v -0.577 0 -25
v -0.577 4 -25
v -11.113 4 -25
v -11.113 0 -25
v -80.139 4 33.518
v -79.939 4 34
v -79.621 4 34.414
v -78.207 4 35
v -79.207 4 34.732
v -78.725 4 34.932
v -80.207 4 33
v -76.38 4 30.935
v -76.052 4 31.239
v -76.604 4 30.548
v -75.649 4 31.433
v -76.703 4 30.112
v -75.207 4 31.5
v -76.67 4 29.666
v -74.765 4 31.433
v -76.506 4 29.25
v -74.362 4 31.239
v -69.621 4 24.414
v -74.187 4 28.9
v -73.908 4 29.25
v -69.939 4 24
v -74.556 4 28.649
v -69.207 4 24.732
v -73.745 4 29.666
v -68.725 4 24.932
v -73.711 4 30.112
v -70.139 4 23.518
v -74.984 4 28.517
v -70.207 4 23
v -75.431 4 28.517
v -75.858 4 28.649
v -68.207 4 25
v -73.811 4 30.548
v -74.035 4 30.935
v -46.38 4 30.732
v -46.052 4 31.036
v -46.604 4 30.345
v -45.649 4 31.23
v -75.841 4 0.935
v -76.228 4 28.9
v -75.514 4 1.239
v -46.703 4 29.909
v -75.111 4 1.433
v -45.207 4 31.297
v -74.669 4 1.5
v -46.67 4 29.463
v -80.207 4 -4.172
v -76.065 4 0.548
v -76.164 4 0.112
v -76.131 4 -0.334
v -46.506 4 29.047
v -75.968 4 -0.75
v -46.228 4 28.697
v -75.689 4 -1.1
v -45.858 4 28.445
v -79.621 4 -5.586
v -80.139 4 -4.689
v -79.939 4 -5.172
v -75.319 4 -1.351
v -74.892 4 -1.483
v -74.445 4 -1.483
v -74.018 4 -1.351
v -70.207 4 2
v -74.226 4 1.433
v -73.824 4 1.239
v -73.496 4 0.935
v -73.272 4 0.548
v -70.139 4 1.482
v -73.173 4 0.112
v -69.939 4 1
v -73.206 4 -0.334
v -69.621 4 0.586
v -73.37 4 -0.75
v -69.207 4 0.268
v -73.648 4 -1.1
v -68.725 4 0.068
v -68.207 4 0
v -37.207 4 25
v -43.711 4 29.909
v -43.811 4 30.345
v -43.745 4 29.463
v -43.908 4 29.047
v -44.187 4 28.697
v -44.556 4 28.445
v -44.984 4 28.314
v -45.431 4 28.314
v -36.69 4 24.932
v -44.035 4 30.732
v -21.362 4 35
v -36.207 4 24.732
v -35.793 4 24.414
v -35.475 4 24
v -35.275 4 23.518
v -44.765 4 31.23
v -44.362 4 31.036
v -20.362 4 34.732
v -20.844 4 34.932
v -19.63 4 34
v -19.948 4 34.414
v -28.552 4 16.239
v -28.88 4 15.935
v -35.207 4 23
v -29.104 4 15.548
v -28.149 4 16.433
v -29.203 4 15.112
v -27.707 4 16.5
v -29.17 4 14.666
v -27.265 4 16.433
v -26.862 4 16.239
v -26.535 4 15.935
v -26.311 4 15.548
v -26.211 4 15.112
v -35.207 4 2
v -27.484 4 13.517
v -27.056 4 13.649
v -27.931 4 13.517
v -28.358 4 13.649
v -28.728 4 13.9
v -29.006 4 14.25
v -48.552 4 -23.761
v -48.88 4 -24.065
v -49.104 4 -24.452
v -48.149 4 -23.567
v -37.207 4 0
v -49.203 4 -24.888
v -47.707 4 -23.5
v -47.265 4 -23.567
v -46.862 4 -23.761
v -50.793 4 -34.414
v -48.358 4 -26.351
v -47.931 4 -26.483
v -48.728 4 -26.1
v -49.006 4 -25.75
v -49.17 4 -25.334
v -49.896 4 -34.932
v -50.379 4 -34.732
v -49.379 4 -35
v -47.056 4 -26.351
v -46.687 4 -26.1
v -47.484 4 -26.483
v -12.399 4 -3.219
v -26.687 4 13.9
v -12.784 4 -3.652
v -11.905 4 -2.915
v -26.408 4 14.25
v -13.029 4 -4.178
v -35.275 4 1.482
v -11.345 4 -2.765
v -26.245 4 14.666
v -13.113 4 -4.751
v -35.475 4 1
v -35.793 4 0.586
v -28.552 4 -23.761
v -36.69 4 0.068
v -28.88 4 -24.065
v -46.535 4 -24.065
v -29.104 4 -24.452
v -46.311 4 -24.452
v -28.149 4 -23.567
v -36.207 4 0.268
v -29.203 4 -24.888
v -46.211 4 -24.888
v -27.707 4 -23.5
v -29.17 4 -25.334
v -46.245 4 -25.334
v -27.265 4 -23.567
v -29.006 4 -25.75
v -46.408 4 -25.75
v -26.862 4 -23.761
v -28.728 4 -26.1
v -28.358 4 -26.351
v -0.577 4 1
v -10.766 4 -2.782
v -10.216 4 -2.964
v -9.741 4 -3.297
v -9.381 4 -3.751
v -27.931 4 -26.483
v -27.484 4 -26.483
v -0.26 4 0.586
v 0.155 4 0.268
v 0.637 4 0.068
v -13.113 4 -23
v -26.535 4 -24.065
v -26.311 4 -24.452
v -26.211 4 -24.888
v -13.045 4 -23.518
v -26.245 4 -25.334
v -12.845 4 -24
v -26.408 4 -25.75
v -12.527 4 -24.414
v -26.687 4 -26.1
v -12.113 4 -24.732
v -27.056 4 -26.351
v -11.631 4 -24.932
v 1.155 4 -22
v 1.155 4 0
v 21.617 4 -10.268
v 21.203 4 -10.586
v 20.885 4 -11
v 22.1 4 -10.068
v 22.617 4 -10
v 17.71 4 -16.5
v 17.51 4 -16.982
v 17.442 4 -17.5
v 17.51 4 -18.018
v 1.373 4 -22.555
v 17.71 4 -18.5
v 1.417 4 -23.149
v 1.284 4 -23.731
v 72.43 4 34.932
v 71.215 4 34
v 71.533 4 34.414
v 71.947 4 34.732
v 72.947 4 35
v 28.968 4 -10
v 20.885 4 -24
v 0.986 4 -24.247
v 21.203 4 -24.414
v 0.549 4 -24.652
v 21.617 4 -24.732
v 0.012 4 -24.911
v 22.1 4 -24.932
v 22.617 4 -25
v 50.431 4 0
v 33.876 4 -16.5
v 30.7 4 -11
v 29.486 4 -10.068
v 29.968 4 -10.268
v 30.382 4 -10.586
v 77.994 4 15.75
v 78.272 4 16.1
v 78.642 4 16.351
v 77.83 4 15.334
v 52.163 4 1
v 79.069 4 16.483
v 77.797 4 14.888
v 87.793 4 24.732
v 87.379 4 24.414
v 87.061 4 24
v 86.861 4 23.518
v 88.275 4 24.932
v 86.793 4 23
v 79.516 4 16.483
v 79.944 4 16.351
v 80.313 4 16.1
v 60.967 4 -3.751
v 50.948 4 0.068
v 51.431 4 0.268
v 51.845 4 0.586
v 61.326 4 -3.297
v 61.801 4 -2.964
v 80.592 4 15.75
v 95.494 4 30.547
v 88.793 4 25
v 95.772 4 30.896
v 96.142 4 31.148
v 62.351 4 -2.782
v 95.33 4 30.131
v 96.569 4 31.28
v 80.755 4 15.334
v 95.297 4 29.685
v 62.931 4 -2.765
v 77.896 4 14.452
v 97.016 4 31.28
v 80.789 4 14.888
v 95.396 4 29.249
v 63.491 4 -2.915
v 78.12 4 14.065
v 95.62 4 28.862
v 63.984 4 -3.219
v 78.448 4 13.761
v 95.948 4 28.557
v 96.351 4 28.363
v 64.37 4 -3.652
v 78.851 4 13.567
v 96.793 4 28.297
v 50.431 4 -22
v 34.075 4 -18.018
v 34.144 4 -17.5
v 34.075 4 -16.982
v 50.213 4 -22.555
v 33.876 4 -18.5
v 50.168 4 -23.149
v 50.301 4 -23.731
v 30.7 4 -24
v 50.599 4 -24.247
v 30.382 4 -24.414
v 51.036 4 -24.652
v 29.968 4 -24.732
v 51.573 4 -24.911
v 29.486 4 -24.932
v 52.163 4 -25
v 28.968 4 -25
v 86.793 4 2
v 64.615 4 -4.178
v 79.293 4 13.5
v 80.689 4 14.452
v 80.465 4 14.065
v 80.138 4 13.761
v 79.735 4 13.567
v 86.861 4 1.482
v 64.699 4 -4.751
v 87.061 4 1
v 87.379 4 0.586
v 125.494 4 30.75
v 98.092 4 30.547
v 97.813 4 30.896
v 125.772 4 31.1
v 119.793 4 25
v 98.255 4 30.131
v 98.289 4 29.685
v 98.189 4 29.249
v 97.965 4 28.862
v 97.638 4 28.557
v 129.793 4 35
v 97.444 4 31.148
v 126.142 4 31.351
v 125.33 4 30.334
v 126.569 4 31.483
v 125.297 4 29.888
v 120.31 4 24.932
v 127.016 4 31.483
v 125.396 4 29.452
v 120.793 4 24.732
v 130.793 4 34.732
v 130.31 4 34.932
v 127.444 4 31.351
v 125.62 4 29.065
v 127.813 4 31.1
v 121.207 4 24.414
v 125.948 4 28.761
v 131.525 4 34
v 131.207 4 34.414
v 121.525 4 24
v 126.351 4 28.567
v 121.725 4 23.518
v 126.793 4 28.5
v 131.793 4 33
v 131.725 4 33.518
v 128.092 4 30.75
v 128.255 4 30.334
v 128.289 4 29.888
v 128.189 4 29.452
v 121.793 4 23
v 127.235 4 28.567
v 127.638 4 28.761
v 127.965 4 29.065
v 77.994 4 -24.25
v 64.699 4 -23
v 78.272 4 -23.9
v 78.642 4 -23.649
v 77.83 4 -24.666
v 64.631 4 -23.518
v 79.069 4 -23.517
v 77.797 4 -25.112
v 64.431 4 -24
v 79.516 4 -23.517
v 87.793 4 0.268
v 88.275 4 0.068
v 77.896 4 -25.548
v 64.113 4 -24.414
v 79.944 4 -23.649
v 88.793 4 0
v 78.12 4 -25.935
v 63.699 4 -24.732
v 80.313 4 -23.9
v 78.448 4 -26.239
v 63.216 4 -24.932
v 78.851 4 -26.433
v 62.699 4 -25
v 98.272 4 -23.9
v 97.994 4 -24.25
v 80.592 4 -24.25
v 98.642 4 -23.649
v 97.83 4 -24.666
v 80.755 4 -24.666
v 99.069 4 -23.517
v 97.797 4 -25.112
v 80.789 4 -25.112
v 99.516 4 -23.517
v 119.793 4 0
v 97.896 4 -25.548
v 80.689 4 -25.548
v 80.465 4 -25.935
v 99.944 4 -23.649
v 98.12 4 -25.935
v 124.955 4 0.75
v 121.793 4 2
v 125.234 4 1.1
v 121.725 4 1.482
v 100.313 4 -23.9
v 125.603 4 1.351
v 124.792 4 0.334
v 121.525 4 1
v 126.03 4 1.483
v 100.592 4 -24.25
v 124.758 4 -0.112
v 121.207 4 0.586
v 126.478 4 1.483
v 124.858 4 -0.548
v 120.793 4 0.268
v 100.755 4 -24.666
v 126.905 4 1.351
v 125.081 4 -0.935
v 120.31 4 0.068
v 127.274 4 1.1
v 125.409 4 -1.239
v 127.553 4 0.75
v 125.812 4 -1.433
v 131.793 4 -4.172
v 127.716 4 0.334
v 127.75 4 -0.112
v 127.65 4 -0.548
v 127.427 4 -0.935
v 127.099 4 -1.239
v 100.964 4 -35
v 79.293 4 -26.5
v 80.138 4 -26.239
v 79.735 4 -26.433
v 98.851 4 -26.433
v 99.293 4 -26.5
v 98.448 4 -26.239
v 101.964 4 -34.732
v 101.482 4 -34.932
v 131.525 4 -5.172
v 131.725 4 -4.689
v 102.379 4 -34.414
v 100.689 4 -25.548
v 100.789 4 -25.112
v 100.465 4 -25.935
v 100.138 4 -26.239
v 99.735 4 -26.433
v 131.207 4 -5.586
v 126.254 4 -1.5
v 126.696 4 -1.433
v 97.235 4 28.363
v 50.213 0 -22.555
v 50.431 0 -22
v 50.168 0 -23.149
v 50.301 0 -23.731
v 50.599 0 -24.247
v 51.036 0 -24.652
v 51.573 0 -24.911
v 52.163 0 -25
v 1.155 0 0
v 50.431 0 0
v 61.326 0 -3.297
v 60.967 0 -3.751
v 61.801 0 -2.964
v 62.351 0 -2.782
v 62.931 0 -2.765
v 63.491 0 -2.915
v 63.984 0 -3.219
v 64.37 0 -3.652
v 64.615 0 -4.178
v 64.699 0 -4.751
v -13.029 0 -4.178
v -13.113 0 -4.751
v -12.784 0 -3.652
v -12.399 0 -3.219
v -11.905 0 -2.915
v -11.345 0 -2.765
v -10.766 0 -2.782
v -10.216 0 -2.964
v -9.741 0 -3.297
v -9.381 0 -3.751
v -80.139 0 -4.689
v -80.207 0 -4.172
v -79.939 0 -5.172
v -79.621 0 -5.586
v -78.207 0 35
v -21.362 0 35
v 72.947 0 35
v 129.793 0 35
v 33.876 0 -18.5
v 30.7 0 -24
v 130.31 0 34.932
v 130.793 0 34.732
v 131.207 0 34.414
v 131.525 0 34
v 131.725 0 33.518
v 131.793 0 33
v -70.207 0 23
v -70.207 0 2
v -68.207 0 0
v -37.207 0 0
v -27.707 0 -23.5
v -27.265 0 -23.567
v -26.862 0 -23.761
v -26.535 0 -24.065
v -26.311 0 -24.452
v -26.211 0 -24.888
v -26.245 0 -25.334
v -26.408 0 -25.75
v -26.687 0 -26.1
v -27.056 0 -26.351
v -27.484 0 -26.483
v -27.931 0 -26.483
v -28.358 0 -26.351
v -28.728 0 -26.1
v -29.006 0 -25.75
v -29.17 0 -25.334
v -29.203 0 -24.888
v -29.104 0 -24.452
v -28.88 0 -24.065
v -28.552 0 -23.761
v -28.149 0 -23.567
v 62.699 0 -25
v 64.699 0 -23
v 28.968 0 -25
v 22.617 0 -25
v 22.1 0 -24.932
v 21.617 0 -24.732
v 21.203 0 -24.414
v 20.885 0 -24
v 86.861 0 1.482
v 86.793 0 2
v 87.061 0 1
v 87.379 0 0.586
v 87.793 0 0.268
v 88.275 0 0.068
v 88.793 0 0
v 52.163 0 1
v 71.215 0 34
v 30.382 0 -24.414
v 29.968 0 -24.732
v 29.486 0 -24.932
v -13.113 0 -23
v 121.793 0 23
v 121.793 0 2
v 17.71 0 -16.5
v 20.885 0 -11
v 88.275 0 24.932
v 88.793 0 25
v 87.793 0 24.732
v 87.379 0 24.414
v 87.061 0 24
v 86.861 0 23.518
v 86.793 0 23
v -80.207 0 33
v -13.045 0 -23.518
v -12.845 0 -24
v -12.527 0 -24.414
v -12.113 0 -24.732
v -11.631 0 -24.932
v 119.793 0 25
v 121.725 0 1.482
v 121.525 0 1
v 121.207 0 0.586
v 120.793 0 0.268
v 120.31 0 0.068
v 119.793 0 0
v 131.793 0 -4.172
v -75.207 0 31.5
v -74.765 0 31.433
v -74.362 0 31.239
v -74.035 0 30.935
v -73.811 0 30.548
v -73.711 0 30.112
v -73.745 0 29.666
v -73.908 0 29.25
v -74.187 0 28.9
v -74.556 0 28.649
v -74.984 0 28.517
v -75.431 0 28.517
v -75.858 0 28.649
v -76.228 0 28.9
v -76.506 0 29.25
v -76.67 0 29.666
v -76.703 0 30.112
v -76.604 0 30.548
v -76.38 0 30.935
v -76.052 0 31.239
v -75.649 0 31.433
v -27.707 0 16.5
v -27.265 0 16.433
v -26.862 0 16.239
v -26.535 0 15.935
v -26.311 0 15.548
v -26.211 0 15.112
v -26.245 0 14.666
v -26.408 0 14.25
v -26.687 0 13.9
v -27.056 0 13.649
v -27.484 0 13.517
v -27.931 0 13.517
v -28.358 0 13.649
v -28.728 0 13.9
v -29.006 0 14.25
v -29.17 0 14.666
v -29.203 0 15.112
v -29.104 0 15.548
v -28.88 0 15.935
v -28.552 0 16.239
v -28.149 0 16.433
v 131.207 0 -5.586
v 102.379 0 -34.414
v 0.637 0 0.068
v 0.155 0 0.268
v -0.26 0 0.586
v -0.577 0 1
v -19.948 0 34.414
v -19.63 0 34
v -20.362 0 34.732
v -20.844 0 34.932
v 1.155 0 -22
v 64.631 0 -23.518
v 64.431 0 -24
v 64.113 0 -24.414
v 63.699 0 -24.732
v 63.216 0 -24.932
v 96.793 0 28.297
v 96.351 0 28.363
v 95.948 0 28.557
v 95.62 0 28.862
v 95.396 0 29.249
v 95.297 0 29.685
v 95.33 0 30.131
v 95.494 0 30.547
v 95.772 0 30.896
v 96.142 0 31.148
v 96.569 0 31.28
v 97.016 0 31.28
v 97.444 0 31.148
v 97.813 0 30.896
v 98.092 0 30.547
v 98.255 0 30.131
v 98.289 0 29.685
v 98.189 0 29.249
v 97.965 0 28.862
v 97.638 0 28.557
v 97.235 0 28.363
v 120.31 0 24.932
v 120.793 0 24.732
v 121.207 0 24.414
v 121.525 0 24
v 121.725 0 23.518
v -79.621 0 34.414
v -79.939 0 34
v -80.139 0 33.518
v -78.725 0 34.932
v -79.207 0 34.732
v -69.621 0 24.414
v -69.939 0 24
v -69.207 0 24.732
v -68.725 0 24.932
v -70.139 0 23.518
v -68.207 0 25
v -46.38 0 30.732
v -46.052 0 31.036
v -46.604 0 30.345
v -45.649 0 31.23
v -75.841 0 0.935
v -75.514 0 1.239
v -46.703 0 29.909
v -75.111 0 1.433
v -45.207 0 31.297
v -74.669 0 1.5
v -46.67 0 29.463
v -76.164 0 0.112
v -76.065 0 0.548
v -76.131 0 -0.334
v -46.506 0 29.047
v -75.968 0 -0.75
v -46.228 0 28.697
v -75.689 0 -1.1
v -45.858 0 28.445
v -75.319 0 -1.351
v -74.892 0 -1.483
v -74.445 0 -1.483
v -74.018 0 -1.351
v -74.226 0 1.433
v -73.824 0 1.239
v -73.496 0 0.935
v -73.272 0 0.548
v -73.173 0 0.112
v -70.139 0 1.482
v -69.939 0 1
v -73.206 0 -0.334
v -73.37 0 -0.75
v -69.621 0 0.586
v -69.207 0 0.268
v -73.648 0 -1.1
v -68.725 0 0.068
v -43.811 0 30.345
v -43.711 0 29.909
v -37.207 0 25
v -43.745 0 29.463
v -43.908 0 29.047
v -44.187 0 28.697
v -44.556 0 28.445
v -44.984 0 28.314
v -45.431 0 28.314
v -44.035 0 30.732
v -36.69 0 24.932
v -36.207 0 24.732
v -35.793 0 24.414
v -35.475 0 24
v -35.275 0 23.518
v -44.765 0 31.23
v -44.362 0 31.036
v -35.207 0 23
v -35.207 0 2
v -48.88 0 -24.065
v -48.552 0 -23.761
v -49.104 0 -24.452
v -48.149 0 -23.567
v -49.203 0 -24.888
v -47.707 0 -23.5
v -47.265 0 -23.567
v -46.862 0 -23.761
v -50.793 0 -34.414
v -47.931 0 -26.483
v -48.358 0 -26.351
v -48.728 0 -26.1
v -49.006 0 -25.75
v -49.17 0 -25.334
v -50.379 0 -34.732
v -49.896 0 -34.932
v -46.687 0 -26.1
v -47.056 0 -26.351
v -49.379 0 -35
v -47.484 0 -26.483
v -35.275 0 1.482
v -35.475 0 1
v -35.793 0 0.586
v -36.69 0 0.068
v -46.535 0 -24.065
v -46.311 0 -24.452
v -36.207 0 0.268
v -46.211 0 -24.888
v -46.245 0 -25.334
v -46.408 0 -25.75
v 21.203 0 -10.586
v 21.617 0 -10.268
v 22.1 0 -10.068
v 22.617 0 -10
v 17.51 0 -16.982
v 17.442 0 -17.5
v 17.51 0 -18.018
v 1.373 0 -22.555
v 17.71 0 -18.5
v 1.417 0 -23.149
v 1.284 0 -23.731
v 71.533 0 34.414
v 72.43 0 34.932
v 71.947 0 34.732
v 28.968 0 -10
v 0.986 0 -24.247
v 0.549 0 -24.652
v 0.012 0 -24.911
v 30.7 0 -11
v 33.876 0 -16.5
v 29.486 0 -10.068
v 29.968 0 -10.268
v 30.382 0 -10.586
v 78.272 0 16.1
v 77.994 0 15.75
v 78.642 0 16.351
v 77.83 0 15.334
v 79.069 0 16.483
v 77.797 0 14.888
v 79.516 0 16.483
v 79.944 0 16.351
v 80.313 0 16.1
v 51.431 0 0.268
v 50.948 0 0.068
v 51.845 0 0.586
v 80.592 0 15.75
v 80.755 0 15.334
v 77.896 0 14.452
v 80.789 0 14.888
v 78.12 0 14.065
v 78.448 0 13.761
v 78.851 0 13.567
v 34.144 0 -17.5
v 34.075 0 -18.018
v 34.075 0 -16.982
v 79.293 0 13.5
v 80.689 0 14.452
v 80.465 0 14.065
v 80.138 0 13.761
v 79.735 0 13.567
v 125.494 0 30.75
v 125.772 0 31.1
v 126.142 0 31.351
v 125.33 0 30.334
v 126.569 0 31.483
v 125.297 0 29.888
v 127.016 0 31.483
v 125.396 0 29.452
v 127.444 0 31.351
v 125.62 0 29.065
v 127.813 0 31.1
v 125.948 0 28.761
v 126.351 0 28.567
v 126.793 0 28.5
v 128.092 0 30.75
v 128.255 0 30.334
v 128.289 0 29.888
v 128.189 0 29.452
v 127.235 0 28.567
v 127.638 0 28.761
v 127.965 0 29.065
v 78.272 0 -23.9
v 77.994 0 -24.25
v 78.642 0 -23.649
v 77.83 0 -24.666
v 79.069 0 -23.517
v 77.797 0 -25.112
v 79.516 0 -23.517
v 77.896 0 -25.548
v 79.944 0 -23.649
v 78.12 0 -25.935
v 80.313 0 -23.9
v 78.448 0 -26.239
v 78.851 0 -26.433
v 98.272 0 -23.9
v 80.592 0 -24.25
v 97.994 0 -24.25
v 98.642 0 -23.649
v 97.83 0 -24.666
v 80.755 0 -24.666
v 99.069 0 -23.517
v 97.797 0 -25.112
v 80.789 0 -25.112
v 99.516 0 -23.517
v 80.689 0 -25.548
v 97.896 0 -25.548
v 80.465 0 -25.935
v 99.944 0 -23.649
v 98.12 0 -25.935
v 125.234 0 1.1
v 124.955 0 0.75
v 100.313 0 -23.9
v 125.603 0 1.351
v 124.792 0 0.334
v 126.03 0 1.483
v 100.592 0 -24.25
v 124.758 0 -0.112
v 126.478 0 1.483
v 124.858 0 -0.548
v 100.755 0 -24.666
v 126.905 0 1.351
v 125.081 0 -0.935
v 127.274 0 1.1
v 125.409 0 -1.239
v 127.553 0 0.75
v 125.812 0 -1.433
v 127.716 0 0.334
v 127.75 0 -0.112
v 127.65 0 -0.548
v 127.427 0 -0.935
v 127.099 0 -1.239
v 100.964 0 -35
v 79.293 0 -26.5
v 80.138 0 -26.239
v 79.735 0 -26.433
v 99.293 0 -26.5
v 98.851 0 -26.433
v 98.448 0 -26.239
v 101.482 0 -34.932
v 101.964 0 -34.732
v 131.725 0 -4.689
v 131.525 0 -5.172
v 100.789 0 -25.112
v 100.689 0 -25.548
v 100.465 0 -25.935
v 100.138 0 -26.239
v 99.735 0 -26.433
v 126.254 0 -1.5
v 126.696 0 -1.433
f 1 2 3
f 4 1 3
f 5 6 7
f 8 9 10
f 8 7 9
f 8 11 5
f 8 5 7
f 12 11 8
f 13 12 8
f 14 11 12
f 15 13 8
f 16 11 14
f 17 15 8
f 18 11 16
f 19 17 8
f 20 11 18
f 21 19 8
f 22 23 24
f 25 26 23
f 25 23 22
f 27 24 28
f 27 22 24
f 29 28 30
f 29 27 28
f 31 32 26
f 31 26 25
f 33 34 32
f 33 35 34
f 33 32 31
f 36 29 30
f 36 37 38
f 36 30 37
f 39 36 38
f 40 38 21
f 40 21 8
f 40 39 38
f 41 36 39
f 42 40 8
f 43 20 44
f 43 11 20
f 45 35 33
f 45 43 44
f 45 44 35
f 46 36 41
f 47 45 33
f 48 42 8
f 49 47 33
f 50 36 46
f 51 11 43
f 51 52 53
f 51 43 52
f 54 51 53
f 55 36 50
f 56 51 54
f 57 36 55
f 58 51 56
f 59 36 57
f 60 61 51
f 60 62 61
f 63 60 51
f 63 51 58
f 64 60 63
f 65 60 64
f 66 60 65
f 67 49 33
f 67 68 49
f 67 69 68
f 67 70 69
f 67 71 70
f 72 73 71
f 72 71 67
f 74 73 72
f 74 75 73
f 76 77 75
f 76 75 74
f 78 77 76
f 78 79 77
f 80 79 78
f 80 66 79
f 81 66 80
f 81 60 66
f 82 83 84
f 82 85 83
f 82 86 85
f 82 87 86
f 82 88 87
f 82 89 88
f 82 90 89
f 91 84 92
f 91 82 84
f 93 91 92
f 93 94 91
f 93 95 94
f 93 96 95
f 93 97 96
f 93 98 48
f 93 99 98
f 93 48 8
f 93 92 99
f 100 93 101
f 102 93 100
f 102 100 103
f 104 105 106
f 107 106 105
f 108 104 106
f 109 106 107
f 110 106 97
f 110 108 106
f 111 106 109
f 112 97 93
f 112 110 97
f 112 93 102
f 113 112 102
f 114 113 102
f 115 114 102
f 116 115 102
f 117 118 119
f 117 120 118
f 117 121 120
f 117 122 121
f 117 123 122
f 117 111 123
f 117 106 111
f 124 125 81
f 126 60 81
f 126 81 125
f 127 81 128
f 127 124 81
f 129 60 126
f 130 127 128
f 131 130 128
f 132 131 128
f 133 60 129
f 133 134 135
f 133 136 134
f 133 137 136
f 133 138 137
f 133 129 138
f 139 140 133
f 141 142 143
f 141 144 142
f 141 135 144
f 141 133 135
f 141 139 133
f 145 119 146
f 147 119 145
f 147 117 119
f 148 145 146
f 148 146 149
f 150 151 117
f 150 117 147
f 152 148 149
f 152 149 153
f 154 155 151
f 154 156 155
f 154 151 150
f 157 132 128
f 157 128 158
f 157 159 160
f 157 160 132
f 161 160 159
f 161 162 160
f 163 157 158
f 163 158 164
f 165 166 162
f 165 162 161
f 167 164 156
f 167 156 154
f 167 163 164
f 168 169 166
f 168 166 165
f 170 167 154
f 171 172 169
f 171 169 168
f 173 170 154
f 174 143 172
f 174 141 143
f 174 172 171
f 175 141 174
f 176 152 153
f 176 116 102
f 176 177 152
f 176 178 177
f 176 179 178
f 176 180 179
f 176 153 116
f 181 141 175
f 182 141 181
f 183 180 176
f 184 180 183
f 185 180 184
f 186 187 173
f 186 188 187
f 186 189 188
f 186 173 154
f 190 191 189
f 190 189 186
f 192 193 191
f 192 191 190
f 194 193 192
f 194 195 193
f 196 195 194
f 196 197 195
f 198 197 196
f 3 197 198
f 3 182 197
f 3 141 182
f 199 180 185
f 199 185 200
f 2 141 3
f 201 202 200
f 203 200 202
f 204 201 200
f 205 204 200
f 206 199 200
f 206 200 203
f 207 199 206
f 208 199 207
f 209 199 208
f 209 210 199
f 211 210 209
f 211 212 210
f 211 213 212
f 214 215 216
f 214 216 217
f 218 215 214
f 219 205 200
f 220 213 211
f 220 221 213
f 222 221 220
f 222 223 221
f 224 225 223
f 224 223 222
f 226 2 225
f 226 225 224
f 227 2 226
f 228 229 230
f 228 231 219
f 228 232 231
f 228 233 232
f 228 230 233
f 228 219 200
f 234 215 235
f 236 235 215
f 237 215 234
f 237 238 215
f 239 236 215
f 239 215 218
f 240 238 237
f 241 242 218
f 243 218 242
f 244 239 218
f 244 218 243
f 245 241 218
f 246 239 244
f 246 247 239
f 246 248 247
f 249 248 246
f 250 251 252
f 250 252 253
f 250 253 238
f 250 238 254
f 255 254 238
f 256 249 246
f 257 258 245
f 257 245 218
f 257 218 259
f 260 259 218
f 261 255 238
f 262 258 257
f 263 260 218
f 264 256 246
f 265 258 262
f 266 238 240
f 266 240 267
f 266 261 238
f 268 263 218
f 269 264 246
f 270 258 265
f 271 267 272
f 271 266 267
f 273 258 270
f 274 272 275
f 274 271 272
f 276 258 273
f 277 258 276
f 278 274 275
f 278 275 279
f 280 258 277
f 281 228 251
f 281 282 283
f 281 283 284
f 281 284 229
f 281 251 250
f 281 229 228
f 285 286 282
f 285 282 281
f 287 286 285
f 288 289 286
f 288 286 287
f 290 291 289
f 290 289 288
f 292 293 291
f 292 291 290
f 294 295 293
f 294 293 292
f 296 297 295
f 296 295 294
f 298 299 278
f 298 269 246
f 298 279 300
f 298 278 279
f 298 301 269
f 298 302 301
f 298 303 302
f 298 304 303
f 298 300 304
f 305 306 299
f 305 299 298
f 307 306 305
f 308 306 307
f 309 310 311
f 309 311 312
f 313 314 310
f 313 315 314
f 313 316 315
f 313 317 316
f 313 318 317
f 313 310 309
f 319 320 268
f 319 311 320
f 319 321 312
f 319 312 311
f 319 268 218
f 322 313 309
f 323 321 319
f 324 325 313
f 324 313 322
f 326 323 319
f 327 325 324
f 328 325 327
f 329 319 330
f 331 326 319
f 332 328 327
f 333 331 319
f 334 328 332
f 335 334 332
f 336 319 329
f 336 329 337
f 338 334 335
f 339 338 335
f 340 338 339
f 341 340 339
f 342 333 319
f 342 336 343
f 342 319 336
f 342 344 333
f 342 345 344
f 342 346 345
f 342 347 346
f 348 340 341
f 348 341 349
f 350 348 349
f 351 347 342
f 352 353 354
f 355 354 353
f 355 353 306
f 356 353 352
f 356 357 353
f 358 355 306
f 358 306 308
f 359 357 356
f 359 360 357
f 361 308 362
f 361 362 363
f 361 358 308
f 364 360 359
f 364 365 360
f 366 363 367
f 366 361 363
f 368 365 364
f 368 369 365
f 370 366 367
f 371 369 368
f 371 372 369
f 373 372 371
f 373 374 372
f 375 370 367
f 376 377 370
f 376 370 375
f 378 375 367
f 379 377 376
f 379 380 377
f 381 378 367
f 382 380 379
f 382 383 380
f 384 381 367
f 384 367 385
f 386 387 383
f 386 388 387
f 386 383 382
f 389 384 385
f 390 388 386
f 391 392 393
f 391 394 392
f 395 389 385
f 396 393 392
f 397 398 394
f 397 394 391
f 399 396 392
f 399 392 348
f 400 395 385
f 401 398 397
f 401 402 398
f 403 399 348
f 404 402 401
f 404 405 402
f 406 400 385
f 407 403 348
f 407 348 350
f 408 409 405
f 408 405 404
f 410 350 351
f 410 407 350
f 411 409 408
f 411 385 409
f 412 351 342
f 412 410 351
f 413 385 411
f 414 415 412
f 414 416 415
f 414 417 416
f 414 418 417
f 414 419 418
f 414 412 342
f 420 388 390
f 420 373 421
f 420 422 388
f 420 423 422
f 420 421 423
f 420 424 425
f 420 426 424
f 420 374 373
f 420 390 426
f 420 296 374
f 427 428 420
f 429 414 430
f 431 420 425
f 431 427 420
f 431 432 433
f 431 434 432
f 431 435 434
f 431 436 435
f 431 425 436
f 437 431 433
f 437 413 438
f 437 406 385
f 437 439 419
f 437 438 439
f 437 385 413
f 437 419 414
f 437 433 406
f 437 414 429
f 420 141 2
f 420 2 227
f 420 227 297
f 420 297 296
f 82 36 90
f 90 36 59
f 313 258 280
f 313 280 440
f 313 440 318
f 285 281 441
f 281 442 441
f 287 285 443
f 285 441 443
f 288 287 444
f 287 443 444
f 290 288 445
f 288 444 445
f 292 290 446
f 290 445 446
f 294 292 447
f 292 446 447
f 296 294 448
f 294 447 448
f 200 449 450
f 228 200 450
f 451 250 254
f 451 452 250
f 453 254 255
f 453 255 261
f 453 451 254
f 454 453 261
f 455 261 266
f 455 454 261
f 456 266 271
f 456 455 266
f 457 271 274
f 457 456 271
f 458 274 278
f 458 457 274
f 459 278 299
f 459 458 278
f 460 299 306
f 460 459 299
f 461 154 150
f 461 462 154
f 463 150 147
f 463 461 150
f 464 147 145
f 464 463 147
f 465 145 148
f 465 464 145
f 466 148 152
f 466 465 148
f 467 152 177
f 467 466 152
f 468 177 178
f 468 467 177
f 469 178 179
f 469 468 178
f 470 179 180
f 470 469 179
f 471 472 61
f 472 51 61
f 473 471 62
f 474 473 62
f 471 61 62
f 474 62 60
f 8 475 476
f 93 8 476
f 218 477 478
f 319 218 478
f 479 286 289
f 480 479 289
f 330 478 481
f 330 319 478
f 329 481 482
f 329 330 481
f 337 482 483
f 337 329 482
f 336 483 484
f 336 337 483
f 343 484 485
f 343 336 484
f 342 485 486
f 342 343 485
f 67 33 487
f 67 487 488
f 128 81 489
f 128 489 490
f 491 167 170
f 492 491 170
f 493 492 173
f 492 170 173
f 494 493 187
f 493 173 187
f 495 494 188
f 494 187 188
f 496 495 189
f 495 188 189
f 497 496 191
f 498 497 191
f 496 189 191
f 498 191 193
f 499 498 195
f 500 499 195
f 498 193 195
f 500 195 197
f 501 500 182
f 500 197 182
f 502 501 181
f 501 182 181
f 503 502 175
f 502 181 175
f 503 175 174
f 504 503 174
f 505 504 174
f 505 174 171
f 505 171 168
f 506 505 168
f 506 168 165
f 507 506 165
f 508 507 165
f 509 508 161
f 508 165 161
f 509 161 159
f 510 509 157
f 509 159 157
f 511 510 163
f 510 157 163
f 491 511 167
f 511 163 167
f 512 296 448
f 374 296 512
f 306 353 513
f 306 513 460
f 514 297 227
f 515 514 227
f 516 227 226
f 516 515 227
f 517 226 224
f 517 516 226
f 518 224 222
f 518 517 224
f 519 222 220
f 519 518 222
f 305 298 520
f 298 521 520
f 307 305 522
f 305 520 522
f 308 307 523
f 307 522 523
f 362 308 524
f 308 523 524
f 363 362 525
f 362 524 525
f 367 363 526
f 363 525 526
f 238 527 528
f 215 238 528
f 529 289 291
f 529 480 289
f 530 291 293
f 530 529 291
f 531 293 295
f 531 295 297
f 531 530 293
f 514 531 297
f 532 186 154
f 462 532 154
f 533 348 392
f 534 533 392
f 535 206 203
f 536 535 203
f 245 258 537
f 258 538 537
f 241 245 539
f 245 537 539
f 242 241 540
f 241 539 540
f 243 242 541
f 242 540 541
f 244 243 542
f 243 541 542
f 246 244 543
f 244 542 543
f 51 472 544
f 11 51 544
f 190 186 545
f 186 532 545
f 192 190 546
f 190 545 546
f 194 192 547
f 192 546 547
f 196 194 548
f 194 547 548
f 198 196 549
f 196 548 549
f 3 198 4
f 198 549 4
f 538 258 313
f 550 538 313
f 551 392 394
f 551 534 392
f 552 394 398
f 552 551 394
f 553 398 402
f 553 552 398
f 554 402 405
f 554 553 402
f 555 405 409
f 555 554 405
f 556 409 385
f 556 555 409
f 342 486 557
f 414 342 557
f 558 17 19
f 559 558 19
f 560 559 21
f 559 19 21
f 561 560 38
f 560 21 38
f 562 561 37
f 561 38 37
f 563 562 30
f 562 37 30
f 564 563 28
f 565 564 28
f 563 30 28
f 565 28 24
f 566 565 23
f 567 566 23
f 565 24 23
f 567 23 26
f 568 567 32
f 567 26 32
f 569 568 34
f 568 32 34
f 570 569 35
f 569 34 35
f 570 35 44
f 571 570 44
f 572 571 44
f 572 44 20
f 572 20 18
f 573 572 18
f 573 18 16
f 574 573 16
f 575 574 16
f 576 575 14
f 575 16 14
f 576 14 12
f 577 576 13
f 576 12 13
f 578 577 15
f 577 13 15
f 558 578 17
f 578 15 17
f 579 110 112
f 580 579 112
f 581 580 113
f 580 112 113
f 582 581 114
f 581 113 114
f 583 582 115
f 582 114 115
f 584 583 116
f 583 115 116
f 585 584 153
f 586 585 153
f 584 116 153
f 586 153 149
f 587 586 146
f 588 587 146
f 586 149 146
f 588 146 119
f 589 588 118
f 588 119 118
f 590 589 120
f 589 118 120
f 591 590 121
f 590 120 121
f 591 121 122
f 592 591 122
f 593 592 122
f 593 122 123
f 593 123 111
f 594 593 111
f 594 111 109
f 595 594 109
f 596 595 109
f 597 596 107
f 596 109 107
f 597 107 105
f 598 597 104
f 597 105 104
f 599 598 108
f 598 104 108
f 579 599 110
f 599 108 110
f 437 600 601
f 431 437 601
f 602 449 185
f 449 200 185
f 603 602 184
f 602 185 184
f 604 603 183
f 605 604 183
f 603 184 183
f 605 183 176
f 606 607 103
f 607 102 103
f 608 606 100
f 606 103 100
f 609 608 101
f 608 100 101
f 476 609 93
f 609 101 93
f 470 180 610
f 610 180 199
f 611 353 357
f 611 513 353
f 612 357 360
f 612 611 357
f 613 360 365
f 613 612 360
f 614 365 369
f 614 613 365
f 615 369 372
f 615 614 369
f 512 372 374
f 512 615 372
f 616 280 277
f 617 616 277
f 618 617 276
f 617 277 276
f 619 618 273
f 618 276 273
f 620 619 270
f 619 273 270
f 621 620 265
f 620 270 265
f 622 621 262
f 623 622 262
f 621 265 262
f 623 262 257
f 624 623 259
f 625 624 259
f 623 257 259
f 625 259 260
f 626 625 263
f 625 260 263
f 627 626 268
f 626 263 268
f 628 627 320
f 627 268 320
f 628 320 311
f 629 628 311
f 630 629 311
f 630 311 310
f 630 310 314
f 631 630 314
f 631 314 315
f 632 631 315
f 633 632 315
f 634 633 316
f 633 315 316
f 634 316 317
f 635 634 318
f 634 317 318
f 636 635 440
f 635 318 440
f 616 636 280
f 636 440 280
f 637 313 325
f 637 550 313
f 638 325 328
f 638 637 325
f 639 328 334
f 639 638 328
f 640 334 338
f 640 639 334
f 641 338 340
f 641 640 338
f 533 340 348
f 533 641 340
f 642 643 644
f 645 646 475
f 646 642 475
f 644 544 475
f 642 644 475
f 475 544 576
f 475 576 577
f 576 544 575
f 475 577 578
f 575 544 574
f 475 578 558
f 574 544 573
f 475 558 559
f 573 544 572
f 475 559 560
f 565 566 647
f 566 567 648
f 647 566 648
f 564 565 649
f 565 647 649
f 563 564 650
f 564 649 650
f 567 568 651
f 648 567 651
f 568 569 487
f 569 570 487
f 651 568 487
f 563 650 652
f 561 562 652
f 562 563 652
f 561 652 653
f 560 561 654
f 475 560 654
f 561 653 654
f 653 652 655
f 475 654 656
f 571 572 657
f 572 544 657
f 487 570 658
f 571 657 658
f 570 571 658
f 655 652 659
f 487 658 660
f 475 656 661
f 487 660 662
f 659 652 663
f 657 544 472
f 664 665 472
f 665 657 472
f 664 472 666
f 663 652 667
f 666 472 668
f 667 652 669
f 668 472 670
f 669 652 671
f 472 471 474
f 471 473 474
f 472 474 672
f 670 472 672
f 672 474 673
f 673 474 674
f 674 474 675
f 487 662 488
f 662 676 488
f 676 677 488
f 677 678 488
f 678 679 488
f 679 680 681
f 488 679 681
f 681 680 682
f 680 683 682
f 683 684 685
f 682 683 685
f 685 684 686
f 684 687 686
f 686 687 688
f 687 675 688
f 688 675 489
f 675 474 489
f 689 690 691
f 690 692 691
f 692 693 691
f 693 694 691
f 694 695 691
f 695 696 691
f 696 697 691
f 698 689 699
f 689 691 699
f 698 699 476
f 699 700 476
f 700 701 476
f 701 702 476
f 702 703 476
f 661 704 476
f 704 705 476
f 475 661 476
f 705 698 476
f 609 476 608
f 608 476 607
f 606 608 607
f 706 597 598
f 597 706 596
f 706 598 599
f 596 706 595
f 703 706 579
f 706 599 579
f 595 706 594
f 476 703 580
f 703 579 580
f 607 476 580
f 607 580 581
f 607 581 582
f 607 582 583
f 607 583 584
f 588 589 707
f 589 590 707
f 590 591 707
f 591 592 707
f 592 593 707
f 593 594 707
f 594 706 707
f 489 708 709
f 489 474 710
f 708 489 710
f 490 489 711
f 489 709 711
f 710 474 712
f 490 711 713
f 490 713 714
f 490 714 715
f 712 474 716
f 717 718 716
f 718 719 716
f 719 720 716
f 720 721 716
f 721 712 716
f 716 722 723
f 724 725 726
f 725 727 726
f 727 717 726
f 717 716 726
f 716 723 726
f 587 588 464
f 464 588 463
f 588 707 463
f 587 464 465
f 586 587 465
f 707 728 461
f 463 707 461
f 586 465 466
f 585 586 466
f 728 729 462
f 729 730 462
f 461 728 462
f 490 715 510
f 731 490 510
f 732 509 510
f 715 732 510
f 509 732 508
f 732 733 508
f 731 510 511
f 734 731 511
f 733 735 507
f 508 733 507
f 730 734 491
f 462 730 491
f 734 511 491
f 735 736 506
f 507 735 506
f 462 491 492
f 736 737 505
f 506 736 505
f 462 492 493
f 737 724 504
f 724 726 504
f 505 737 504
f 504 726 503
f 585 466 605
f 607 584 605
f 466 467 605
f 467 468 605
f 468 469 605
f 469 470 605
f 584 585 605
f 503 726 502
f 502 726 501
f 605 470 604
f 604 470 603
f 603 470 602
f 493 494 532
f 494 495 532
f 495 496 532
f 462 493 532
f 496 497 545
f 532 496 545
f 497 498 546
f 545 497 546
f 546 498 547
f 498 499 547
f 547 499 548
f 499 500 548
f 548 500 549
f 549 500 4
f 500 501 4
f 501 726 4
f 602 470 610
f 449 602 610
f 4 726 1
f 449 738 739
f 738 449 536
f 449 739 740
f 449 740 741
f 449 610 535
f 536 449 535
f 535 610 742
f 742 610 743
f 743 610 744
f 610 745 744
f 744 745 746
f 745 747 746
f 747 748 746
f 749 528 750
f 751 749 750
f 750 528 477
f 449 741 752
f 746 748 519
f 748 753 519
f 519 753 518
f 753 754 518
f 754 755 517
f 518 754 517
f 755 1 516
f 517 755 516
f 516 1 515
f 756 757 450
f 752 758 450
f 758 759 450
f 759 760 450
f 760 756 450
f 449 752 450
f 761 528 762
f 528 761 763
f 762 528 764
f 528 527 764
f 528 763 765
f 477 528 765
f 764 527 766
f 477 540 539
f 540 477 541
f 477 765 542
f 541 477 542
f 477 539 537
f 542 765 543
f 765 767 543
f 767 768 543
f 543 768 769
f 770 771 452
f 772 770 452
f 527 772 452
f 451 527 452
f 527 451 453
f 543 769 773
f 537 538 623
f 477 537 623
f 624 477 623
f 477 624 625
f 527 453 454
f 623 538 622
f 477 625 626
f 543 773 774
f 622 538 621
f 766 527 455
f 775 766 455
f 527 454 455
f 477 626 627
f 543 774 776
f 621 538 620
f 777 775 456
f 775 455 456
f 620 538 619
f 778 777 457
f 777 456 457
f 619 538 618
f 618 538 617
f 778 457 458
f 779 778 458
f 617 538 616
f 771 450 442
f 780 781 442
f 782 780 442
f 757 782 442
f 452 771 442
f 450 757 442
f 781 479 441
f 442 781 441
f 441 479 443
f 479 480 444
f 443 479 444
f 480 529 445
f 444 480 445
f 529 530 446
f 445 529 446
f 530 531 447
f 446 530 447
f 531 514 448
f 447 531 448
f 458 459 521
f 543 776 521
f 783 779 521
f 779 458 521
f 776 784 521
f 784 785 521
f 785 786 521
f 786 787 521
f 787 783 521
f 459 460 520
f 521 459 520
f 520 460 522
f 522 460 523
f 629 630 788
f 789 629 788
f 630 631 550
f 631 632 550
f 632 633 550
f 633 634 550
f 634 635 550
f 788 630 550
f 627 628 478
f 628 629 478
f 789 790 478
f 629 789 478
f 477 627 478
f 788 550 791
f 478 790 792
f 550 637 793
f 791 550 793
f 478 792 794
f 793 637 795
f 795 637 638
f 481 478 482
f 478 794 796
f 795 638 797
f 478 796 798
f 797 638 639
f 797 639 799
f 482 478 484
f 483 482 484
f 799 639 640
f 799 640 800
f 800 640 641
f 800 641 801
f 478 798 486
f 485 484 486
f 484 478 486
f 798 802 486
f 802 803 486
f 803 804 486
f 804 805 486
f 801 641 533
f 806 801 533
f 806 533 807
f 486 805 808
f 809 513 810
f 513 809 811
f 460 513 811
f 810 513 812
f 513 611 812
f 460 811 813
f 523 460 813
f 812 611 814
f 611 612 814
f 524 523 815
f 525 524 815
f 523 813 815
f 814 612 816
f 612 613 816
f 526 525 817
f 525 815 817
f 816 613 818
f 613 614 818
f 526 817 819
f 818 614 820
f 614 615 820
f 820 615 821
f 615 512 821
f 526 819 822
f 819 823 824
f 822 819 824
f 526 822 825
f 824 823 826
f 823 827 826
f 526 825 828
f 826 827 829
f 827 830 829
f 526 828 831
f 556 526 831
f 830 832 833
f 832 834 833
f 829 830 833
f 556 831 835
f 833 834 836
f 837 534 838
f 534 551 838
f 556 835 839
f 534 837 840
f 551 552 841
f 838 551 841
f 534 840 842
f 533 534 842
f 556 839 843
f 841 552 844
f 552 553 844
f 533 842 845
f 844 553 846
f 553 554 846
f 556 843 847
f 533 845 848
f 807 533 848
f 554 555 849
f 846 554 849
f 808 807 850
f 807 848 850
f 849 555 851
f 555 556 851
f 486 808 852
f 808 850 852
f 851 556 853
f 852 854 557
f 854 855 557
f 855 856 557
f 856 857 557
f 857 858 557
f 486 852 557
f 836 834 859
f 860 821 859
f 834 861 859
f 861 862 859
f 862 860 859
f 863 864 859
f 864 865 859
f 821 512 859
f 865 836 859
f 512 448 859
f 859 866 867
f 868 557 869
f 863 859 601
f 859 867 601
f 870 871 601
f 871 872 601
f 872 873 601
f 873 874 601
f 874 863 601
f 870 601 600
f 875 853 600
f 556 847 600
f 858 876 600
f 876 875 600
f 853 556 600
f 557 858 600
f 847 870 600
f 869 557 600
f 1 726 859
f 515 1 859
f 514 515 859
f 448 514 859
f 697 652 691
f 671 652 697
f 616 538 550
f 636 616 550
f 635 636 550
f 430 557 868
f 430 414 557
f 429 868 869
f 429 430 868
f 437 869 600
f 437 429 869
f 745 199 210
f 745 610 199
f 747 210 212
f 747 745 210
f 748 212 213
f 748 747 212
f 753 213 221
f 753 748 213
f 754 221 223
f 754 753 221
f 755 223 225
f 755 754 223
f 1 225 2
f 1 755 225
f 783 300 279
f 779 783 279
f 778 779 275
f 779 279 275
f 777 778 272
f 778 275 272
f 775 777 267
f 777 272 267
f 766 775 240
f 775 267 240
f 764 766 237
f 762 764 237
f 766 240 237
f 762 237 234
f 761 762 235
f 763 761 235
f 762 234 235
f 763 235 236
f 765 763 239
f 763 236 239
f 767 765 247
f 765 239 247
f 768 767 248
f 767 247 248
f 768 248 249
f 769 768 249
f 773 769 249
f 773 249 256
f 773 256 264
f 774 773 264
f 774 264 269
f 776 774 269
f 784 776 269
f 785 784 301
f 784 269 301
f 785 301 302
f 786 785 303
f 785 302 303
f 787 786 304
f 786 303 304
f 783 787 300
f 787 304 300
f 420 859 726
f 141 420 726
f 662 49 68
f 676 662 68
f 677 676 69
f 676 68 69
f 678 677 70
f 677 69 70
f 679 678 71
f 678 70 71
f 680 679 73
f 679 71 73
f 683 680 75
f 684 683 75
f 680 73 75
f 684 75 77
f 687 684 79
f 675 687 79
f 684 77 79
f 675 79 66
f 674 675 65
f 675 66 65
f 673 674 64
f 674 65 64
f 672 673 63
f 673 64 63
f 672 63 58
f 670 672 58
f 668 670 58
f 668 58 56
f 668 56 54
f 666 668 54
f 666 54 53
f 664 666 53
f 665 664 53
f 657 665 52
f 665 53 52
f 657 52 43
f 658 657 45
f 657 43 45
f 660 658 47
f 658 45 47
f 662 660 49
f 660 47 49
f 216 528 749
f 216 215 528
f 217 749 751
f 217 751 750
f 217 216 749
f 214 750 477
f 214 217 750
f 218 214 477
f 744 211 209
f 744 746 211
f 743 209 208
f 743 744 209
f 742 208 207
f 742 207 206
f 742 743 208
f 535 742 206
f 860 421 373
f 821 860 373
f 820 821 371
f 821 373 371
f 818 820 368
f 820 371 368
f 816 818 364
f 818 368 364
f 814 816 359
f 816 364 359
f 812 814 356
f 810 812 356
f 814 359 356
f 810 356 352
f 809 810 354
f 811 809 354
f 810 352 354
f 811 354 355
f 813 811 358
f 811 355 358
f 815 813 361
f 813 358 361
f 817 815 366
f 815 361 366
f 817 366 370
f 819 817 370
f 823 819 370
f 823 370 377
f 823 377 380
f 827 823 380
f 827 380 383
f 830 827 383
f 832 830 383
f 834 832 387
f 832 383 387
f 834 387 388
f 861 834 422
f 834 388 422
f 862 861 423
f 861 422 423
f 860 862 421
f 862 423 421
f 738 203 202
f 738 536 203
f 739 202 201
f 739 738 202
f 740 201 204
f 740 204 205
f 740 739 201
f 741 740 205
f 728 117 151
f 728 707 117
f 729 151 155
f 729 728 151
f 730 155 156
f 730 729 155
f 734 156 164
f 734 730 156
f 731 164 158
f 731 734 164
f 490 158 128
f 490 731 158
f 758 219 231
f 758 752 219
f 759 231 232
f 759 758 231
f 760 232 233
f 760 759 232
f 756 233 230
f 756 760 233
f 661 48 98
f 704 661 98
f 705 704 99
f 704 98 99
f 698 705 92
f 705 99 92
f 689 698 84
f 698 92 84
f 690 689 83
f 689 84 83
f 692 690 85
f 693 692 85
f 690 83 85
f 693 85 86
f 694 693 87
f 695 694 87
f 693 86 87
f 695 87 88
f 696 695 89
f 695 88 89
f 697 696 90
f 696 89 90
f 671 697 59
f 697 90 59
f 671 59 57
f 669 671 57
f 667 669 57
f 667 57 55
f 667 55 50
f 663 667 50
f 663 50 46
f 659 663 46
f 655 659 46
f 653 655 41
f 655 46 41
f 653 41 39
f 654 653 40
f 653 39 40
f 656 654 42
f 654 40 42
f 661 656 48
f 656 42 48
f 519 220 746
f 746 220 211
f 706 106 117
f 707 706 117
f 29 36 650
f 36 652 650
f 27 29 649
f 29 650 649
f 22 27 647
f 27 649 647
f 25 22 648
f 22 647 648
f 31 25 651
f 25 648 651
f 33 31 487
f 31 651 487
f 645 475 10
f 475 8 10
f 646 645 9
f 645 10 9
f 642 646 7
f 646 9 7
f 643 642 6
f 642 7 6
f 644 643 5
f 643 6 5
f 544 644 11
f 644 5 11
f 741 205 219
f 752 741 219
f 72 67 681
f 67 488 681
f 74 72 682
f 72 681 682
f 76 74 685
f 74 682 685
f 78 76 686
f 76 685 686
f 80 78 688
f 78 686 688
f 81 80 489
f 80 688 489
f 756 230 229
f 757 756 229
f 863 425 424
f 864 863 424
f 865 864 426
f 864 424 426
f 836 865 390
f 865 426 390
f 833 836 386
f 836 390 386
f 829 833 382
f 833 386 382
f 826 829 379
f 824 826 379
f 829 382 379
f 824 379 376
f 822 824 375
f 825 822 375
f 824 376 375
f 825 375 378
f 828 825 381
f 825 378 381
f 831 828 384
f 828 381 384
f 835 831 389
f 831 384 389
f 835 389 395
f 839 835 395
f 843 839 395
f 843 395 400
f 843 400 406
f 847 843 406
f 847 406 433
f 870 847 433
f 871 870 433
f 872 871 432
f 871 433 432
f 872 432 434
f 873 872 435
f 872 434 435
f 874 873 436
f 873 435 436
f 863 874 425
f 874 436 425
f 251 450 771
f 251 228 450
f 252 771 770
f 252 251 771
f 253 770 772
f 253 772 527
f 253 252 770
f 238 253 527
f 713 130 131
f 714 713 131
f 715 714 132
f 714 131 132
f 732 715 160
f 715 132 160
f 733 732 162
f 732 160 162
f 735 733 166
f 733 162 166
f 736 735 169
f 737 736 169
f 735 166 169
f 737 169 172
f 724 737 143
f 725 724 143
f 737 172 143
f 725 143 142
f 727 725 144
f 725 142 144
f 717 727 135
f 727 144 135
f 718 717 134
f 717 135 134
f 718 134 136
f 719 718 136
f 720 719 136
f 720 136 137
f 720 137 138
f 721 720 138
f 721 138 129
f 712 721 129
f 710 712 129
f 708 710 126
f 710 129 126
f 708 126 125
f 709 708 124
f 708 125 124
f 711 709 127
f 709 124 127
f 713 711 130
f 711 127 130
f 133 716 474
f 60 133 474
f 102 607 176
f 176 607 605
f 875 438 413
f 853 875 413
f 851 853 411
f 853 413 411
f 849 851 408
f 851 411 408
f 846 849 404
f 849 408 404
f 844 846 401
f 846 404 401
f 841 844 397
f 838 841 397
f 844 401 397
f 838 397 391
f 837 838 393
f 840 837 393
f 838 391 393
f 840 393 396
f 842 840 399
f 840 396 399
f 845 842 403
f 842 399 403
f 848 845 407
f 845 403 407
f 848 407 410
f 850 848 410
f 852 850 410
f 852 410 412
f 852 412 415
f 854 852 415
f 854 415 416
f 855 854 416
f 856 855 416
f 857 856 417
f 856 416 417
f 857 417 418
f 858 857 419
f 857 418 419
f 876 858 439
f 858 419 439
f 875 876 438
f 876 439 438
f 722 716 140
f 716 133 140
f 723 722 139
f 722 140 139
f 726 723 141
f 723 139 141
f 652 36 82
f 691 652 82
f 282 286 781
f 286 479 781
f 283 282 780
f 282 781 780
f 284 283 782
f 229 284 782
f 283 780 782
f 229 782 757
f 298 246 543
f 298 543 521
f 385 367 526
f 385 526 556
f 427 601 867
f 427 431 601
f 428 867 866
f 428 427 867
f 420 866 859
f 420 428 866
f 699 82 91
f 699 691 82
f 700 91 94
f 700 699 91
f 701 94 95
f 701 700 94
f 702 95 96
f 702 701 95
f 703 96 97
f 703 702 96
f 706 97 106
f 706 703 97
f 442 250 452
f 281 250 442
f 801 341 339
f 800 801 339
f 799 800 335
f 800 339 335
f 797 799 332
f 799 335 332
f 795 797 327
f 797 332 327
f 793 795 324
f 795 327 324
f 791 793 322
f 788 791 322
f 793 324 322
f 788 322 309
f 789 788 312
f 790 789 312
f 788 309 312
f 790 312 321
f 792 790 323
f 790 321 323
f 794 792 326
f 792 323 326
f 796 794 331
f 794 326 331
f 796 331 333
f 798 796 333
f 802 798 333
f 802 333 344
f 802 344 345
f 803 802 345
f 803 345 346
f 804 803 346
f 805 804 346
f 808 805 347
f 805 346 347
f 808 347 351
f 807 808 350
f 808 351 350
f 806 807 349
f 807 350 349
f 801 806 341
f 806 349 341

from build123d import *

# Parameters (mm, degrees)
EXTRUDE_1_DEPTH     = 4
SKETCH_2_W          = 35
SKETCH_2_H          = 25
CUT_EXTRUDE_1_DEPTH = 4
SKETCH_3_R          = 1.5
CUT_EXTRUDE_2_DEPTH = 4
CUT_EXTRUDE_3_DEPTH = 4
FILLET_1_R          = 2


with BuildPart() as part:
    # 草图1 → 凸台-拉伸1 (new body)
    with BuildSketch(Plane(origin=(0, 0, 0), x_dir=(1, 0, 0), z_dir=(0, 1, 0))):
        Polygon((0, 0), (51.585481157, 0), (71.792740578, -35), (131.792740578, -35), (131.792740578, 5), (101.792740578, 35), (-50.207259422, 35), (-80.207259422, 5), (-80.207259422, -35), (-20.207259422, -35), align=None)
    extrude(amount=EXTRUDE_1_DEPTH)

    # 草图2 → 切除-拉伸1 (cut)
    with BuildSketch(Plane(origin=(0, 4, 0), x_dir=(1, 0, 0), z_dir=(0, 1, 0))):
        with Locations((-52.707259422, -12.5)):
            Rectangle(SKETCH_2_W, SKETCH_2_H)
        with Locations((104.292740578, -12.5)):
            Rectangle(SKETCH_2_W, SKETCH_2_H)
    extrude(amount=-CUT_EXTRUDE_1_DEPTH, mode=Mode.SUBTRACT)

    # 草图3 → 切除-拉伸2 (cut)
    with BuildSketch(Plane(origin=(0, 4, 0), x_dir=(1, 0, 0), z_dir=(0, 1, 0))):
        with Locations(Location((-75.207259422, -30, 0), (0, 0, 270))):
            Circle(SKETCH_3_R)
        with Locations(Location((-45.207259422, -29.79681333, 0), (0, 0, 270))):
            Circle(SKETCH_3_R)
        with Locations(Location((-74.668557439, 0, 0), (0, 0, 270))):
            Circle(SKETCH_3_R)
        with Locations(Location((126.254038596, 0, 0), (0, 0, 90))):
            Circle(SKETCH_3_R)
        with Locations(Location((96.792740578, -29.79681333, 0), (0, 0, 90))):
            Circle(SKETCH_3_R)
        with Locations(Location((126.792740578, -30, 0), (0, 0, 90))):
            Circle(SKETCH_3_R)
        with Locations(Location((-27.707259422, -15, 0), (0, 0, 270))):
            Circle(SKETCH_3_R)
        with Locations(Location((-47.707259422, 25, 0), (0, 0, 270))):
            Circle(SKETCH_3_R)
        with Locations(Location((-27.707259422, 25, 0), (0, 0, 270))):
            Circle(SKETCH_3_R)
        with Locations(Location((79.292740578, -15, 0), (0, 0, 90))):
            Circle(SKETCH_3_R)
        with Locations(Location((99.292740578, 25, 0), (0, 0, 90))):
            Circle(SKETCH_3_R)
        with Locations(Location((79.292740578, 25, 0), (0, 0, 90))):
            Circle(SKETCH_3_R)
    extrude(amount=-CUT_EXTRUDE_2_DEPTH, mode=Mode.SUBTRACT)

    # 草图4 → 切除-拉伸3 (cut)
    with BuildSketch(Plane(origin=(0, 4, 0), x_dir=(1, 0, 0), z_dir=(0, 1, 0))):
        Polygon((34.452994616, 17.5), (30.122867597, 25), (21.462613559, 25), (17.132486541, 17.5), (21.462613559, 10), (30.122867597, 10), align=None)
        Polygon((48.698729811, 25), (64.698729811, 25), (64.698729811, -2.712812921), align=None)
        Polygon((-13.113248654, 25), (-13.113248654, -2.712812921), (2.886751346, 25), align=None)
    extrude(amount=-CUT_EXTRUDE_3_DEPTH, mode=Mode.SUBTRACT)

    # 圆角1
    fillet_1_edges = [part.edges().sort_by_distance(p)[0] for p in [
        (34.452994616, 2, -17.5),
        (30.122867597, 2, -10),
        (21.462613559, 2, -10),
        (17.132486541, 2, -17.5),
        (21.462613559, 2, -25),
        (30.122867597, 2, -25),
        (64.698729811, 2, -25),
        (64.698729811, 2, 2.712812921),
        (48.698729811, 2, -25),
        (-13.113248654, 2, -25),
        (2.886751346, 2, -25),
        (-13.113248654, 2, 2.712812921),
        (-20.207259422, 2, 35),
        (-80.207259422, 2, 35),
        (-80.207259422, 2, -5),
        (-50.207259422, 2, -35),
        (101.792740578, 2, -35),
        (131.792740578, 2, -5),
        (131.792740578, 2, 35),
        (71.792740578, 2, 35),
        (51.585481157, 2, 0),
        (0, 2, 0),
        (-70.207259422, 2, 25),
        (-70.207259422, 2, 0),
        (-35.207259422, 2, 0),
        (-35.207259422, 2, 25),
        (121.792740578, 2, 0),
        (121.792740578, 2, 25),
        (86.792740578, 2, 25),
        (86.792740578, 2, 0),
    ]]
    fillet(fillet_1_edges, radius=FILLET_1_R)


solid = part.part
